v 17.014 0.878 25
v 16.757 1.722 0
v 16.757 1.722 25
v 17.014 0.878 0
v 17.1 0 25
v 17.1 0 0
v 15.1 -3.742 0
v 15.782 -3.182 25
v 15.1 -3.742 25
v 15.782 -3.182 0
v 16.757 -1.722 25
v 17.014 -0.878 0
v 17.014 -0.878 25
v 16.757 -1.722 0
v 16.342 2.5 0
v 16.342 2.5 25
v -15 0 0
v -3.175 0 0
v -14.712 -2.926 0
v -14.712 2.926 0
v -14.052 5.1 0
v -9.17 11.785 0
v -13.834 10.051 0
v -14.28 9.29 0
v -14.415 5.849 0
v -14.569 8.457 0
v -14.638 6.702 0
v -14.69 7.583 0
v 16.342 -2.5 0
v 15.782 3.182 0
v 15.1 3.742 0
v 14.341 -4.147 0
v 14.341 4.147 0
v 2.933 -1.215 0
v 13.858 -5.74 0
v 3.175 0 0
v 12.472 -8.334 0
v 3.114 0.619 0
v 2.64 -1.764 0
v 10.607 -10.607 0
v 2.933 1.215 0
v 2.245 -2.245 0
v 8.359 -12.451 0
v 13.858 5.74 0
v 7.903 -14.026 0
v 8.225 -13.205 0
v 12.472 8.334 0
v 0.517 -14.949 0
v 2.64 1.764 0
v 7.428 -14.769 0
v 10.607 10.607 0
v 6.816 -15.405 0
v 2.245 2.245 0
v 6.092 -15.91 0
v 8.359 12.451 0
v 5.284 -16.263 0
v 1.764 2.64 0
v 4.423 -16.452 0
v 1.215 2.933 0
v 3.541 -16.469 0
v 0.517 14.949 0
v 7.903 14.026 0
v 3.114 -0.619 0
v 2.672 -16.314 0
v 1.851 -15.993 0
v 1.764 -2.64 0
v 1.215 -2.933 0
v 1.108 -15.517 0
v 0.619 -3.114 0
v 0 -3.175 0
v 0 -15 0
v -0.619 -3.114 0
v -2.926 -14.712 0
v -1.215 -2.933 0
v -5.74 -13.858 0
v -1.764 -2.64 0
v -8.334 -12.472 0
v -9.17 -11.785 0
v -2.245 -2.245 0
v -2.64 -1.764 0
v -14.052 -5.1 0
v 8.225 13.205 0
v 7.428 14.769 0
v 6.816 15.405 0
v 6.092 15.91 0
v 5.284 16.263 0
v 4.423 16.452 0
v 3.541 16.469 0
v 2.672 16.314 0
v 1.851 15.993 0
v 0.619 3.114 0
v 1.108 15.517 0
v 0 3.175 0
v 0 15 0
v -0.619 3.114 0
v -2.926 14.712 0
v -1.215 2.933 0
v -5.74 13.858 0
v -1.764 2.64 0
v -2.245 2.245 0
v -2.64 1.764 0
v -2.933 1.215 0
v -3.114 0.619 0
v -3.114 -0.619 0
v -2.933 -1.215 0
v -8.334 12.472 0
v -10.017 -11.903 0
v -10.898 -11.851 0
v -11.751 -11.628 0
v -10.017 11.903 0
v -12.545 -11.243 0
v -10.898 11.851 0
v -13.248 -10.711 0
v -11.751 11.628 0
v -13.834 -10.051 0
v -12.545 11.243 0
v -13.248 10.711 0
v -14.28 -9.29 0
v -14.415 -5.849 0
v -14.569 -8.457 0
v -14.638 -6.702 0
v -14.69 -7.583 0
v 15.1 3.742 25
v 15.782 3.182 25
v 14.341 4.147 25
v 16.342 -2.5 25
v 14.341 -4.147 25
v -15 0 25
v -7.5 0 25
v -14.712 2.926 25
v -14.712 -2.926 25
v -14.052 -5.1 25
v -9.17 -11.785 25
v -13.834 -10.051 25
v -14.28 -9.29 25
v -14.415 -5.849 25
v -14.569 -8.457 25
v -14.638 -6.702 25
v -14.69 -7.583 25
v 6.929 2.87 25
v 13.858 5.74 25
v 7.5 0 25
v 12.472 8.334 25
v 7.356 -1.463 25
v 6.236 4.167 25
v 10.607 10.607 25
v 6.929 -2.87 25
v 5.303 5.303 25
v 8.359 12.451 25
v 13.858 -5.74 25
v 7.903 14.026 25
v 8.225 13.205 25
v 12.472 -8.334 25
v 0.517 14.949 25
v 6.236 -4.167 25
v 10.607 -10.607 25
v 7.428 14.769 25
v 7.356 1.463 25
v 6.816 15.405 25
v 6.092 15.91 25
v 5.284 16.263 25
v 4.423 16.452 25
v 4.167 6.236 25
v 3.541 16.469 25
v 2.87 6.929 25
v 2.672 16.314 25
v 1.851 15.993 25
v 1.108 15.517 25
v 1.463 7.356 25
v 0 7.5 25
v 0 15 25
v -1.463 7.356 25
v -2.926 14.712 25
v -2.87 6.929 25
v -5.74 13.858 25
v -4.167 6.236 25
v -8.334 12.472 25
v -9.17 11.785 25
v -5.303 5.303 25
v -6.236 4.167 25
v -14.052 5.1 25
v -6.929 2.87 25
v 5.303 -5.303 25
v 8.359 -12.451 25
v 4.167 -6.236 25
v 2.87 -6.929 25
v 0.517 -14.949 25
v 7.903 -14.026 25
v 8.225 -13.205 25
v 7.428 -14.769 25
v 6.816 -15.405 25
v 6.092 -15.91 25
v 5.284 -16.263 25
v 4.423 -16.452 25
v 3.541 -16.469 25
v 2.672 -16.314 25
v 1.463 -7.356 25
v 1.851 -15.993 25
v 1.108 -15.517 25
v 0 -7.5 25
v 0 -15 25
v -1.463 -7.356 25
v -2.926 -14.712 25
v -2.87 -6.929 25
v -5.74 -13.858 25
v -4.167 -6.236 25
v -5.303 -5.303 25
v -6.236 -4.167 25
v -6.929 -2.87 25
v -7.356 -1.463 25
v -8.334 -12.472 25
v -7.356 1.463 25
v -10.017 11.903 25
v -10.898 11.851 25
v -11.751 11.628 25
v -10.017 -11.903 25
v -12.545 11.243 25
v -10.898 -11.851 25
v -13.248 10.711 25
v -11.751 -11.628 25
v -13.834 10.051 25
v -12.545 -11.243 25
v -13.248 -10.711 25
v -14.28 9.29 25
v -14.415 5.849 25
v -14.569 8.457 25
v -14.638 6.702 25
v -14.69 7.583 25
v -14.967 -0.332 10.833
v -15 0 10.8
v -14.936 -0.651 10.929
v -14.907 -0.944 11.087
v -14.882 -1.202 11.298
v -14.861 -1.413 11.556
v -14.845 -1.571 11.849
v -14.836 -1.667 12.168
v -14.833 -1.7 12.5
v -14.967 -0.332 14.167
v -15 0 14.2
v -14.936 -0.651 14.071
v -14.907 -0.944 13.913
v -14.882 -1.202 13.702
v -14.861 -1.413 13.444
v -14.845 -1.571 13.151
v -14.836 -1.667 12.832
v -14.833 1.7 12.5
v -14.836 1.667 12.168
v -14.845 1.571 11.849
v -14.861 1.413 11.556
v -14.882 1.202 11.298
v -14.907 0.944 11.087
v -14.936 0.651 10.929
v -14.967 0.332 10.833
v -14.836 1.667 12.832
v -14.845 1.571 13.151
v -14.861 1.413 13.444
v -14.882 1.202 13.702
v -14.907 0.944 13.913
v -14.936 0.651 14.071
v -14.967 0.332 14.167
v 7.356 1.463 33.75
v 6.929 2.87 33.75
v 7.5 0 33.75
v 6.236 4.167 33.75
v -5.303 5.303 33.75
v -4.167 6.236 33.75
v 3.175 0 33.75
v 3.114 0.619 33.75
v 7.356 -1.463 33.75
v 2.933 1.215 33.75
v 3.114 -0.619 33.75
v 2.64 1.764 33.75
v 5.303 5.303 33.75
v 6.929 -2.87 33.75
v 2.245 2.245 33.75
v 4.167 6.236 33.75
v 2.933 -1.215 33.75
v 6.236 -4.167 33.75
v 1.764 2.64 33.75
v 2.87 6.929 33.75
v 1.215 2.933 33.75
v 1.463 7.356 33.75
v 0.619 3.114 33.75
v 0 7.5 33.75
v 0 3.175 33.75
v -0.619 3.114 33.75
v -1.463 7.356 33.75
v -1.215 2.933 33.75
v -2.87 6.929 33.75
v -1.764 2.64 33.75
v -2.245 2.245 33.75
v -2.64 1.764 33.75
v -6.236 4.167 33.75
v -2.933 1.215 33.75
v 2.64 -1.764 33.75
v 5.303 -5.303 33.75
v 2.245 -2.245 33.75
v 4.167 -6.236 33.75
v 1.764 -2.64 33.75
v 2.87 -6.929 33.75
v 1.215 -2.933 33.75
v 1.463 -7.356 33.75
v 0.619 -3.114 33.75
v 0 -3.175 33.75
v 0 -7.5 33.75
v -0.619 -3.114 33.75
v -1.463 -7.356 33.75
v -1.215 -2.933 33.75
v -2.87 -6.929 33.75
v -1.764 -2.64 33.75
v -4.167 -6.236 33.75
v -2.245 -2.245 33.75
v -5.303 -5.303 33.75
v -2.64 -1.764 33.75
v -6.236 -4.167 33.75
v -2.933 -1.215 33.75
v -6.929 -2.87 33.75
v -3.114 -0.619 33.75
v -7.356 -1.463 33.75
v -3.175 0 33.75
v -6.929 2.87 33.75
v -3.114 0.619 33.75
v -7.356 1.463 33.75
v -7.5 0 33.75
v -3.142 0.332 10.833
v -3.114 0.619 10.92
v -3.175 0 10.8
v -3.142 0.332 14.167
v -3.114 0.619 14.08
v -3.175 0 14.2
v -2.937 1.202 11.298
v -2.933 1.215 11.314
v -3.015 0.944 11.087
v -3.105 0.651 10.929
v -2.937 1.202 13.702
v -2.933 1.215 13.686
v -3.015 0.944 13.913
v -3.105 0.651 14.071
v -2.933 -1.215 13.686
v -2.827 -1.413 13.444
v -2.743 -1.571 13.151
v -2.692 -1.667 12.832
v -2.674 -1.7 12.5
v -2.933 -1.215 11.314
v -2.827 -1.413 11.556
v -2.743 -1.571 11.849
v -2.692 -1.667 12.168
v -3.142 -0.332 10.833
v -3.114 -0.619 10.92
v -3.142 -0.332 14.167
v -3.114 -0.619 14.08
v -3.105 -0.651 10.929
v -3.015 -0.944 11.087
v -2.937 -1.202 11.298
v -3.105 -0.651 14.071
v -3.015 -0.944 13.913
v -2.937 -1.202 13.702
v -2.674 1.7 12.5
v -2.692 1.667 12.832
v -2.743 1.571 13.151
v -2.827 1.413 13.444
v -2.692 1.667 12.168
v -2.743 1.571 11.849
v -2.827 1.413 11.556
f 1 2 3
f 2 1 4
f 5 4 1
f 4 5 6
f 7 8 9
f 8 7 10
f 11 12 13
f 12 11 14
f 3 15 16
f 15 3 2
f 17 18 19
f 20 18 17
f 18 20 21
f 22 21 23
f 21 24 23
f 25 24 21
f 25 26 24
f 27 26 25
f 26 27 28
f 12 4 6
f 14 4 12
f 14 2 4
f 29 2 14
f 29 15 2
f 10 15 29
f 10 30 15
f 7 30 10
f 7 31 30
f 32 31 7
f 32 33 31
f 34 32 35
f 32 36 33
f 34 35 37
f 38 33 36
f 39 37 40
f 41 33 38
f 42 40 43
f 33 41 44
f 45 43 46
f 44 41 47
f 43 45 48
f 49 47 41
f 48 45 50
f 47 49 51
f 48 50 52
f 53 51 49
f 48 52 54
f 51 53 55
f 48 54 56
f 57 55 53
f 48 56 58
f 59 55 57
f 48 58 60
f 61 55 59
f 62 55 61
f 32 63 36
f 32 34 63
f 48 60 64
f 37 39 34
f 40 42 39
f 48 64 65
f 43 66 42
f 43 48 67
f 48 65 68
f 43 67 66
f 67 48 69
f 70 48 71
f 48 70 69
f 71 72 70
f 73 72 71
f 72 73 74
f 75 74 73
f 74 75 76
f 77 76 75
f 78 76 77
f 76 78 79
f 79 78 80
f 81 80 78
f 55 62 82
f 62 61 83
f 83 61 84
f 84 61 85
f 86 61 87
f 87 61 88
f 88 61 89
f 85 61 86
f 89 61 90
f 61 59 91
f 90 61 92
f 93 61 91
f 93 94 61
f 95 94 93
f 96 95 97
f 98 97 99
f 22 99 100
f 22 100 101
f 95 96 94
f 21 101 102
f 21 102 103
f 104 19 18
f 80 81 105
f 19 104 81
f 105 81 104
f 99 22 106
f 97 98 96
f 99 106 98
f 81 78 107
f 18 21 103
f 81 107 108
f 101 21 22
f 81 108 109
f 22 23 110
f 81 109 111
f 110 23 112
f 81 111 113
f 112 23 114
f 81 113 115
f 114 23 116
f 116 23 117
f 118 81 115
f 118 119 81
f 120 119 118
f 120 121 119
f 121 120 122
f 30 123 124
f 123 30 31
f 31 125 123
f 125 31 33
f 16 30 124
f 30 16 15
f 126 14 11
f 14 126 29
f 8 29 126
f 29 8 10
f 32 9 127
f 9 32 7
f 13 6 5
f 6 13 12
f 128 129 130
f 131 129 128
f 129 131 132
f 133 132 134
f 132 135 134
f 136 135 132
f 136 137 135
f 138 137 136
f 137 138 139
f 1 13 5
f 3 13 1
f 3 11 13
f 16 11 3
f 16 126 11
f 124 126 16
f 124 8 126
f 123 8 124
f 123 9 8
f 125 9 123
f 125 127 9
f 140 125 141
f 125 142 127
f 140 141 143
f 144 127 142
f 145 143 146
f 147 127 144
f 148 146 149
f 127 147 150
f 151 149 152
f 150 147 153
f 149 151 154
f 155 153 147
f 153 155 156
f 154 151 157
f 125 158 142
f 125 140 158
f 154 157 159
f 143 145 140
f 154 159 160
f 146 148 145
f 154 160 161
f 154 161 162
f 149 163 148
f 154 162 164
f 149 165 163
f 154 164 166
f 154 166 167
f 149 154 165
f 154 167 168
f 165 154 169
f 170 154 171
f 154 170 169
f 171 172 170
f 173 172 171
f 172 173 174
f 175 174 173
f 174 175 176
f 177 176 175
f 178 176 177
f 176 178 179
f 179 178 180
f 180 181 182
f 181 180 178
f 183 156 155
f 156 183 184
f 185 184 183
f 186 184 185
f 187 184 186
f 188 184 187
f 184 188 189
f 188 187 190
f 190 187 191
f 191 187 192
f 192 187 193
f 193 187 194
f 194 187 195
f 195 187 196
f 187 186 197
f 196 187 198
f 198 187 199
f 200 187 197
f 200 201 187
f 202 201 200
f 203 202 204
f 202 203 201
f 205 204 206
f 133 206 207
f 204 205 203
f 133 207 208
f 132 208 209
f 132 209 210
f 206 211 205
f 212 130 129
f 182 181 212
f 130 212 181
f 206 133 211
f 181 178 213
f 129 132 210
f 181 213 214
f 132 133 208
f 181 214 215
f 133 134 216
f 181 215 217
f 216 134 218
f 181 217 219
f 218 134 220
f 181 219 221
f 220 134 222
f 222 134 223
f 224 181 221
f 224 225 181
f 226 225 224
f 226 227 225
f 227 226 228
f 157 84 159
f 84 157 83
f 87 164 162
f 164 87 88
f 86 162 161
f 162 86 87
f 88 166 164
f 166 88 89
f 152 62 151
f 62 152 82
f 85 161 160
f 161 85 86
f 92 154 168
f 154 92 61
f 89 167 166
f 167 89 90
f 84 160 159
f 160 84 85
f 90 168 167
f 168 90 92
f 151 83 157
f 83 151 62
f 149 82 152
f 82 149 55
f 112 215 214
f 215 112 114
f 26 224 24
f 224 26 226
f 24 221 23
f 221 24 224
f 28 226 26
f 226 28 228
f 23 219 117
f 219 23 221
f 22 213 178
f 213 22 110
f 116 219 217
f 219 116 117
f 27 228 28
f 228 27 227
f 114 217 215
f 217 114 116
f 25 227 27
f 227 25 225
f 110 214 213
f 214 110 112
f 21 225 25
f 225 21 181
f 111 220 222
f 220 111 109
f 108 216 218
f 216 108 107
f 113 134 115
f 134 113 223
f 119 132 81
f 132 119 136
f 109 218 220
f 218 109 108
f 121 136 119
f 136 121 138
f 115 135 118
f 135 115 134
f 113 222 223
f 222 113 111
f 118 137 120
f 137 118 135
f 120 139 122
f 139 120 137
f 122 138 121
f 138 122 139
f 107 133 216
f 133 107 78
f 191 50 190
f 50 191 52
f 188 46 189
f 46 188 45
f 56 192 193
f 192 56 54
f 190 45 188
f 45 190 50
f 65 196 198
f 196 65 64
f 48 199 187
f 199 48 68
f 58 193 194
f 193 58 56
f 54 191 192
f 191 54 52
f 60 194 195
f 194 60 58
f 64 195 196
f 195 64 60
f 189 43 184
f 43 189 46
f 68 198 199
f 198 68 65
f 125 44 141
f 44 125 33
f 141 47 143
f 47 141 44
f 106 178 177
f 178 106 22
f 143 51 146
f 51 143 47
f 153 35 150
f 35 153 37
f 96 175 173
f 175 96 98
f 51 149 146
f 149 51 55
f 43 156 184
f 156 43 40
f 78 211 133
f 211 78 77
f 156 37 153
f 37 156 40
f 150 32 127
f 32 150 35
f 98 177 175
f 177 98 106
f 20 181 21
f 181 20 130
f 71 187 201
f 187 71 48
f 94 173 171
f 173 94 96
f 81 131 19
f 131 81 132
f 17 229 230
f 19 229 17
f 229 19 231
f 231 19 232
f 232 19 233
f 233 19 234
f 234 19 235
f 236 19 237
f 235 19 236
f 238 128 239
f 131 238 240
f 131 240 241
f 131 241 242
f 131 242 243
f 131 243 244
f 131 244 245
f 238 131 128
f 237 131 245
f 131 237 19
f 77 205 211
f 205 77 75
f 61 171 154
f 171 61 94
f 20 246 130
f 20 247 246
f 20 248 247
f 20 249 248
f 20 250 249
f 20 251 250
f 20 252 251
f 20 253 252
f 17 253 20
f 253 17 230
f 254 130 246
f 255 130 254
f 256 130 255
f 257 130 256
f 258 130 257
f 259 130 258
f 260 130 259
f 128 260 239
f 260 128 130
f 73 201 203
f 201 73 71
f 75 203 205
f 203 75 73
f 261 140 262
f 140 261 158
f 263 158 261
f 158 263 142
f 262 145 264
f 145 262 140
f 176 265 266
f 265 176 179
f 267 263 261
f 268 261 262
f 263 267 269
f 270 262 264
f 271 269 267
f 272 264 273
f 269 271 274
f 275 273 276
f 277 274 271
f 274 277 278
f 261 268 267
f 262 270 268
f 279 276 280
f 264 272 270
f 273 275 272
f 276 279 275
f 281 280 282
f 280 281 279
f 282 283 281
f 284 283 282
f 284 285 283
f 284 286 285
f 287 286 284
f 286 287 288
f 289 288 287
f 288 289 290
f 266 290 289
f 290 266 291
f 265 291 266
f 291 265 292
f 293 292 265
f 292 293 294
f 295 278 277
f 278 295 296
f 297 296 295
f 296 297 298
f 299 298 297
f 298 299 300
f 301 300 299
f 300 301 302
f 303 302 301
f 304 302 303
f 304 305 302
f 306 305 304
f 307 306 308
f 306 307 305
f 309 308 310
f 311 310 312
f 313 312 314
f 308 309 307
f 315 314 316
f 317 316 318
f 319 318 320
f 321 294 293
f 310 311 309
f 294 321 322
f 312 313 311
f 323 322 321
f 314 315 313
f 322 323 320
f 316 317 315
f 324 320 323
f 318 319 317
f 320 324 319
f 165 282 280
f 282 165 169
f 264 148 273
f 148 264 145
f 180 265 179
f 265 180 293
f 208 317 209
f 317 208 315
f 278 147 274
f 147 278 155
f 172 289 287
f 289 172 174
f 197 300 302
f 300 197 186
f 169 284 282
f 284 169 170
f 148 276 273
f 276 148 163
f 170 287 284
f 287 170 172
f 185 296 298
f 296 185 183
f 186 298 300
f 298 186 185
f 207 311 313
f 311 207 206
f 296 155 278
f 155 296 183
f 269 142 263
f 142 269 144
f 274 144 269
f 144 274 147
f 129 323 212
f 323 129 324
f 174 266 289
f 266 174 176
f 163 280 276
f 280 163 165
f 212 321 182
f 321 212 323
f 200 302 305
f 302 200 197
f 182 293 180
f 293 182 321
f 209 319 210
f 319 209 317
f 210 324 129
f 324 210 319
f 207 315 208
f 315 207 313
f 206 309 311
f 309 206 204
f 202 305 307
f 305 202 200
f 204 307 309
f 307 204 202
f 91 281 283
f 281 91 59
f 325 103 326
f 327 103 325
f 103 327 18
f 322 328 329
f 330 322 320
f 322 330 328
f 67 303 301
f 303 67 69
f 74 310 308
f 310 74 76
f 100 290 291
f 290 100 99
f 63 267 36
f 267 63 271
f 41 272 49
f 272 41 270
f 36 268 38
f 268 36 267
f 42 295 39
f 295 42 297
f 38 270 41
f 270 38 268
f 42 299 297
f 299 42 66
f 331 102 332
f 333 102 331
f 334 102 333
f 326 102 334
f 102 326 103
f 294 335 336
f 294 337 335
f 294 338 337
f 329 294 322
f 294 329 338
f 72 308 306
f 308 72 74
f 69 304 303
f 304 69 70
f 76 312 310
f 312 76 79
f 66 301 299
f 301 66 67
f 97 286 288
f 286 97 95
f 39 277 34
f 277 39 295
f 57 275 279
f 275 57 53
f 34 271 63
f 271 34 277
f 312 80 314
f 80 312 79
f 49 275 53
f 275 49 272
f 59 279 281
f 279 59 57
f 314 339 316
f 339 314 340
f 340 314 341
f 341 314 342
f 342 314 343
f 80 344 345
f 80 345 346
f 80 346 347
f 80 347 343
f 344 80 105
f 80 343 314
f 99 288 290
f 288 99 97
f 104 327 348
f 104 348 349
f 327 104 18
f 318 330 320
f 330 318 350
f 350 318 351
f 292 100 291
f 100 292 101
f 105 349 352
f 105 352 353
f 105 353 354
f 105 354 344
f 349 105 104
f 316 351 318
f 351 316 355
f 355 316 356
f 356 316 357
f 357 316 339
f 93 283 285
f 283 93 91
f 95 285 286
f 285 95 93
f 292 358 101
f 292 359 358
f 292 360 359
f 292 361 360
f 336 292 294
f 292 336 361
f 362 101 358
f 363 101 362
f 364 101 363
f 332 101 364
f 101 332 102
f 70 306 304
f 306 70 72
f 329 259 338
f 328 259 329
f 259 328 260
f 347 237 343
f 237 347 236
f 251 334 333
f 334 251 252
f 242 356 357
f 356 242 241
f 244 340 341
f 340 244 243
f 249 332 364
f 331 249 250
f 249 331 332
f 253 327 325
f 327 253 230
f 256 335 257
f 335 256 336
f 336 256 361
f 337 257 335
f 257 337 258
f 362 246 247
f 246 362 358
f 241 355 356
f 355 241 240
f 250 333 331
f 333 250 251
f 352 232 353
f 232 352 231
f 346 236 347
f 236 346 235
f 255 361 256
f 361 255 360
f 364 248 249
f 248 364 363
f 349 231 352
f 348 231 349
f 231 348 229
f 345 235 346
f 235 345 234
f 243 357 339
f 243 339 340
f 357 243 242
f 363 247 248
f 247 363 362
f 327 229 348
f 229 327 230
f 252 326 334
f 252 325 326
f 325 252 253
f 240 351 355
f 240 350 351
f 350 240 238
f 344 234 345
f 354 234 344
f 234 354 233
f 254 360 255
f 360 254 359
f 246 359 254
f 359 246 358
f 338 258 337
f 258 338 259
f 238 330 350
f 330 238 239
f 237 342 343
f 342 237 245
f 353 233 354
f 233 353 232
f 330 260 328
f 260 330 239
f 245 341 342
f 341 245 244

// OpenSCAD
$fn = 32;

// ----------------------------------------------------------------------
// Hand knob: 30 x 30 x 33.75 mm
// ----------------------------------------------------------------------

// --- parameters (mm) ---
head_d = 30;              // knob diameter
head_h = 25;              // knob height
hole_d = 6.35;            // shaft bore
set_d = 3.4;              // set screw tap hole
notch_d = 1.33;           // knurl groove diameter
lobes = 5;                // grip lobes
cap_h = 8.75;             // raised centre cap
cap_d = 15;               // centre cap diameter

module body() {
  cylinder(h = head_h, d = head_d);
  for (i = [0 : lobes - 1])
    rotate([0, 0, i * 360 / lobes])
      translate([head_d * 0.42, 0, 0])
        cylinder(h = head_h, d = head_d * 0.3);
}

module cap() {
  translate([0, 0, head_h - 1]) cylinder(h = cap_h + 1, d = cap_d);
}

difference() {
  union() {
    body();
    cap();
  }
  translate([0, 0, -1]) cylinder(h = head_h + cap_h + 2, d = hole_d);
  translate([-head_d / 2 - 1, 0, head_h * 0.5]) rotate([0, 90, 0]) cylinder(h = head_d / 2 + 2, d = set_d);
}
